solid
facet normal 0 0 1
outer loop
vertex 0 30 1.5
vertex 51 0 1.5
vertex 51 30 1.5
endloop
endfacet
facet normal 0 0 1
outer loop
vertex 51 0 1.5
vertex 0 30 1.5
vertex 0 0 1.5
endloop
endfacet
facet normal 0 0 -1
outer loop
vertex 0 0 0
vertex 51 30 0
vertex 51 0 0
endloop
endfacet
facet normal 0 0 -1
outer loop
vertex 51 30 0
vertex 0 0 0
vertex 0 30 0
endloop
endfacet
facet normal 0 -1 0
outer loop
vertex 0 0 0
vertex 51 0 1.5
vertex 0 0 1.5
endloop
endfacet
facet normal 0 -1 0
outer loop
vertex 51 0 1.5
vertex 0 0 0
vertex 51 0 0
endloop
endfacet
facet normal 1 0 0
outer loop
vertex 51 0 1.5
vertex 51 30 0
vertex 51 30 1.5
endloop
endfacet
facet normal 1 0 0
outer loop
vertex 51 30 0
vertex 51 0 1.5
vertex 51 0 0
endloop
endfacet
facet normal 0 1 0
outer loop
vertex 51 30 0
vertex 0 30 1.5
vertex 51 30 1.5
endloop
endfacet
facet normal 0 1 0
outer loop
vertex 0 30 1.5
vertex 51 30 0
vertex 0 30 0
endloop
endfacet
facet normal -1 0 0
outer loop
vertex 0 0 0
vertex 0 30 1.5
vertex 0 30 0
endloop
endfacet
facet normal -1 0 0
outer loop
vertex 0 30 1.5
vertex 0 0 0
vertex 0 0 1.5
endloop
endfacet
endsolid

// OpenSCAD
echo(version=version());
// Increase the visual detail
$fn = 100;

cube([51, 30,1.5]);
